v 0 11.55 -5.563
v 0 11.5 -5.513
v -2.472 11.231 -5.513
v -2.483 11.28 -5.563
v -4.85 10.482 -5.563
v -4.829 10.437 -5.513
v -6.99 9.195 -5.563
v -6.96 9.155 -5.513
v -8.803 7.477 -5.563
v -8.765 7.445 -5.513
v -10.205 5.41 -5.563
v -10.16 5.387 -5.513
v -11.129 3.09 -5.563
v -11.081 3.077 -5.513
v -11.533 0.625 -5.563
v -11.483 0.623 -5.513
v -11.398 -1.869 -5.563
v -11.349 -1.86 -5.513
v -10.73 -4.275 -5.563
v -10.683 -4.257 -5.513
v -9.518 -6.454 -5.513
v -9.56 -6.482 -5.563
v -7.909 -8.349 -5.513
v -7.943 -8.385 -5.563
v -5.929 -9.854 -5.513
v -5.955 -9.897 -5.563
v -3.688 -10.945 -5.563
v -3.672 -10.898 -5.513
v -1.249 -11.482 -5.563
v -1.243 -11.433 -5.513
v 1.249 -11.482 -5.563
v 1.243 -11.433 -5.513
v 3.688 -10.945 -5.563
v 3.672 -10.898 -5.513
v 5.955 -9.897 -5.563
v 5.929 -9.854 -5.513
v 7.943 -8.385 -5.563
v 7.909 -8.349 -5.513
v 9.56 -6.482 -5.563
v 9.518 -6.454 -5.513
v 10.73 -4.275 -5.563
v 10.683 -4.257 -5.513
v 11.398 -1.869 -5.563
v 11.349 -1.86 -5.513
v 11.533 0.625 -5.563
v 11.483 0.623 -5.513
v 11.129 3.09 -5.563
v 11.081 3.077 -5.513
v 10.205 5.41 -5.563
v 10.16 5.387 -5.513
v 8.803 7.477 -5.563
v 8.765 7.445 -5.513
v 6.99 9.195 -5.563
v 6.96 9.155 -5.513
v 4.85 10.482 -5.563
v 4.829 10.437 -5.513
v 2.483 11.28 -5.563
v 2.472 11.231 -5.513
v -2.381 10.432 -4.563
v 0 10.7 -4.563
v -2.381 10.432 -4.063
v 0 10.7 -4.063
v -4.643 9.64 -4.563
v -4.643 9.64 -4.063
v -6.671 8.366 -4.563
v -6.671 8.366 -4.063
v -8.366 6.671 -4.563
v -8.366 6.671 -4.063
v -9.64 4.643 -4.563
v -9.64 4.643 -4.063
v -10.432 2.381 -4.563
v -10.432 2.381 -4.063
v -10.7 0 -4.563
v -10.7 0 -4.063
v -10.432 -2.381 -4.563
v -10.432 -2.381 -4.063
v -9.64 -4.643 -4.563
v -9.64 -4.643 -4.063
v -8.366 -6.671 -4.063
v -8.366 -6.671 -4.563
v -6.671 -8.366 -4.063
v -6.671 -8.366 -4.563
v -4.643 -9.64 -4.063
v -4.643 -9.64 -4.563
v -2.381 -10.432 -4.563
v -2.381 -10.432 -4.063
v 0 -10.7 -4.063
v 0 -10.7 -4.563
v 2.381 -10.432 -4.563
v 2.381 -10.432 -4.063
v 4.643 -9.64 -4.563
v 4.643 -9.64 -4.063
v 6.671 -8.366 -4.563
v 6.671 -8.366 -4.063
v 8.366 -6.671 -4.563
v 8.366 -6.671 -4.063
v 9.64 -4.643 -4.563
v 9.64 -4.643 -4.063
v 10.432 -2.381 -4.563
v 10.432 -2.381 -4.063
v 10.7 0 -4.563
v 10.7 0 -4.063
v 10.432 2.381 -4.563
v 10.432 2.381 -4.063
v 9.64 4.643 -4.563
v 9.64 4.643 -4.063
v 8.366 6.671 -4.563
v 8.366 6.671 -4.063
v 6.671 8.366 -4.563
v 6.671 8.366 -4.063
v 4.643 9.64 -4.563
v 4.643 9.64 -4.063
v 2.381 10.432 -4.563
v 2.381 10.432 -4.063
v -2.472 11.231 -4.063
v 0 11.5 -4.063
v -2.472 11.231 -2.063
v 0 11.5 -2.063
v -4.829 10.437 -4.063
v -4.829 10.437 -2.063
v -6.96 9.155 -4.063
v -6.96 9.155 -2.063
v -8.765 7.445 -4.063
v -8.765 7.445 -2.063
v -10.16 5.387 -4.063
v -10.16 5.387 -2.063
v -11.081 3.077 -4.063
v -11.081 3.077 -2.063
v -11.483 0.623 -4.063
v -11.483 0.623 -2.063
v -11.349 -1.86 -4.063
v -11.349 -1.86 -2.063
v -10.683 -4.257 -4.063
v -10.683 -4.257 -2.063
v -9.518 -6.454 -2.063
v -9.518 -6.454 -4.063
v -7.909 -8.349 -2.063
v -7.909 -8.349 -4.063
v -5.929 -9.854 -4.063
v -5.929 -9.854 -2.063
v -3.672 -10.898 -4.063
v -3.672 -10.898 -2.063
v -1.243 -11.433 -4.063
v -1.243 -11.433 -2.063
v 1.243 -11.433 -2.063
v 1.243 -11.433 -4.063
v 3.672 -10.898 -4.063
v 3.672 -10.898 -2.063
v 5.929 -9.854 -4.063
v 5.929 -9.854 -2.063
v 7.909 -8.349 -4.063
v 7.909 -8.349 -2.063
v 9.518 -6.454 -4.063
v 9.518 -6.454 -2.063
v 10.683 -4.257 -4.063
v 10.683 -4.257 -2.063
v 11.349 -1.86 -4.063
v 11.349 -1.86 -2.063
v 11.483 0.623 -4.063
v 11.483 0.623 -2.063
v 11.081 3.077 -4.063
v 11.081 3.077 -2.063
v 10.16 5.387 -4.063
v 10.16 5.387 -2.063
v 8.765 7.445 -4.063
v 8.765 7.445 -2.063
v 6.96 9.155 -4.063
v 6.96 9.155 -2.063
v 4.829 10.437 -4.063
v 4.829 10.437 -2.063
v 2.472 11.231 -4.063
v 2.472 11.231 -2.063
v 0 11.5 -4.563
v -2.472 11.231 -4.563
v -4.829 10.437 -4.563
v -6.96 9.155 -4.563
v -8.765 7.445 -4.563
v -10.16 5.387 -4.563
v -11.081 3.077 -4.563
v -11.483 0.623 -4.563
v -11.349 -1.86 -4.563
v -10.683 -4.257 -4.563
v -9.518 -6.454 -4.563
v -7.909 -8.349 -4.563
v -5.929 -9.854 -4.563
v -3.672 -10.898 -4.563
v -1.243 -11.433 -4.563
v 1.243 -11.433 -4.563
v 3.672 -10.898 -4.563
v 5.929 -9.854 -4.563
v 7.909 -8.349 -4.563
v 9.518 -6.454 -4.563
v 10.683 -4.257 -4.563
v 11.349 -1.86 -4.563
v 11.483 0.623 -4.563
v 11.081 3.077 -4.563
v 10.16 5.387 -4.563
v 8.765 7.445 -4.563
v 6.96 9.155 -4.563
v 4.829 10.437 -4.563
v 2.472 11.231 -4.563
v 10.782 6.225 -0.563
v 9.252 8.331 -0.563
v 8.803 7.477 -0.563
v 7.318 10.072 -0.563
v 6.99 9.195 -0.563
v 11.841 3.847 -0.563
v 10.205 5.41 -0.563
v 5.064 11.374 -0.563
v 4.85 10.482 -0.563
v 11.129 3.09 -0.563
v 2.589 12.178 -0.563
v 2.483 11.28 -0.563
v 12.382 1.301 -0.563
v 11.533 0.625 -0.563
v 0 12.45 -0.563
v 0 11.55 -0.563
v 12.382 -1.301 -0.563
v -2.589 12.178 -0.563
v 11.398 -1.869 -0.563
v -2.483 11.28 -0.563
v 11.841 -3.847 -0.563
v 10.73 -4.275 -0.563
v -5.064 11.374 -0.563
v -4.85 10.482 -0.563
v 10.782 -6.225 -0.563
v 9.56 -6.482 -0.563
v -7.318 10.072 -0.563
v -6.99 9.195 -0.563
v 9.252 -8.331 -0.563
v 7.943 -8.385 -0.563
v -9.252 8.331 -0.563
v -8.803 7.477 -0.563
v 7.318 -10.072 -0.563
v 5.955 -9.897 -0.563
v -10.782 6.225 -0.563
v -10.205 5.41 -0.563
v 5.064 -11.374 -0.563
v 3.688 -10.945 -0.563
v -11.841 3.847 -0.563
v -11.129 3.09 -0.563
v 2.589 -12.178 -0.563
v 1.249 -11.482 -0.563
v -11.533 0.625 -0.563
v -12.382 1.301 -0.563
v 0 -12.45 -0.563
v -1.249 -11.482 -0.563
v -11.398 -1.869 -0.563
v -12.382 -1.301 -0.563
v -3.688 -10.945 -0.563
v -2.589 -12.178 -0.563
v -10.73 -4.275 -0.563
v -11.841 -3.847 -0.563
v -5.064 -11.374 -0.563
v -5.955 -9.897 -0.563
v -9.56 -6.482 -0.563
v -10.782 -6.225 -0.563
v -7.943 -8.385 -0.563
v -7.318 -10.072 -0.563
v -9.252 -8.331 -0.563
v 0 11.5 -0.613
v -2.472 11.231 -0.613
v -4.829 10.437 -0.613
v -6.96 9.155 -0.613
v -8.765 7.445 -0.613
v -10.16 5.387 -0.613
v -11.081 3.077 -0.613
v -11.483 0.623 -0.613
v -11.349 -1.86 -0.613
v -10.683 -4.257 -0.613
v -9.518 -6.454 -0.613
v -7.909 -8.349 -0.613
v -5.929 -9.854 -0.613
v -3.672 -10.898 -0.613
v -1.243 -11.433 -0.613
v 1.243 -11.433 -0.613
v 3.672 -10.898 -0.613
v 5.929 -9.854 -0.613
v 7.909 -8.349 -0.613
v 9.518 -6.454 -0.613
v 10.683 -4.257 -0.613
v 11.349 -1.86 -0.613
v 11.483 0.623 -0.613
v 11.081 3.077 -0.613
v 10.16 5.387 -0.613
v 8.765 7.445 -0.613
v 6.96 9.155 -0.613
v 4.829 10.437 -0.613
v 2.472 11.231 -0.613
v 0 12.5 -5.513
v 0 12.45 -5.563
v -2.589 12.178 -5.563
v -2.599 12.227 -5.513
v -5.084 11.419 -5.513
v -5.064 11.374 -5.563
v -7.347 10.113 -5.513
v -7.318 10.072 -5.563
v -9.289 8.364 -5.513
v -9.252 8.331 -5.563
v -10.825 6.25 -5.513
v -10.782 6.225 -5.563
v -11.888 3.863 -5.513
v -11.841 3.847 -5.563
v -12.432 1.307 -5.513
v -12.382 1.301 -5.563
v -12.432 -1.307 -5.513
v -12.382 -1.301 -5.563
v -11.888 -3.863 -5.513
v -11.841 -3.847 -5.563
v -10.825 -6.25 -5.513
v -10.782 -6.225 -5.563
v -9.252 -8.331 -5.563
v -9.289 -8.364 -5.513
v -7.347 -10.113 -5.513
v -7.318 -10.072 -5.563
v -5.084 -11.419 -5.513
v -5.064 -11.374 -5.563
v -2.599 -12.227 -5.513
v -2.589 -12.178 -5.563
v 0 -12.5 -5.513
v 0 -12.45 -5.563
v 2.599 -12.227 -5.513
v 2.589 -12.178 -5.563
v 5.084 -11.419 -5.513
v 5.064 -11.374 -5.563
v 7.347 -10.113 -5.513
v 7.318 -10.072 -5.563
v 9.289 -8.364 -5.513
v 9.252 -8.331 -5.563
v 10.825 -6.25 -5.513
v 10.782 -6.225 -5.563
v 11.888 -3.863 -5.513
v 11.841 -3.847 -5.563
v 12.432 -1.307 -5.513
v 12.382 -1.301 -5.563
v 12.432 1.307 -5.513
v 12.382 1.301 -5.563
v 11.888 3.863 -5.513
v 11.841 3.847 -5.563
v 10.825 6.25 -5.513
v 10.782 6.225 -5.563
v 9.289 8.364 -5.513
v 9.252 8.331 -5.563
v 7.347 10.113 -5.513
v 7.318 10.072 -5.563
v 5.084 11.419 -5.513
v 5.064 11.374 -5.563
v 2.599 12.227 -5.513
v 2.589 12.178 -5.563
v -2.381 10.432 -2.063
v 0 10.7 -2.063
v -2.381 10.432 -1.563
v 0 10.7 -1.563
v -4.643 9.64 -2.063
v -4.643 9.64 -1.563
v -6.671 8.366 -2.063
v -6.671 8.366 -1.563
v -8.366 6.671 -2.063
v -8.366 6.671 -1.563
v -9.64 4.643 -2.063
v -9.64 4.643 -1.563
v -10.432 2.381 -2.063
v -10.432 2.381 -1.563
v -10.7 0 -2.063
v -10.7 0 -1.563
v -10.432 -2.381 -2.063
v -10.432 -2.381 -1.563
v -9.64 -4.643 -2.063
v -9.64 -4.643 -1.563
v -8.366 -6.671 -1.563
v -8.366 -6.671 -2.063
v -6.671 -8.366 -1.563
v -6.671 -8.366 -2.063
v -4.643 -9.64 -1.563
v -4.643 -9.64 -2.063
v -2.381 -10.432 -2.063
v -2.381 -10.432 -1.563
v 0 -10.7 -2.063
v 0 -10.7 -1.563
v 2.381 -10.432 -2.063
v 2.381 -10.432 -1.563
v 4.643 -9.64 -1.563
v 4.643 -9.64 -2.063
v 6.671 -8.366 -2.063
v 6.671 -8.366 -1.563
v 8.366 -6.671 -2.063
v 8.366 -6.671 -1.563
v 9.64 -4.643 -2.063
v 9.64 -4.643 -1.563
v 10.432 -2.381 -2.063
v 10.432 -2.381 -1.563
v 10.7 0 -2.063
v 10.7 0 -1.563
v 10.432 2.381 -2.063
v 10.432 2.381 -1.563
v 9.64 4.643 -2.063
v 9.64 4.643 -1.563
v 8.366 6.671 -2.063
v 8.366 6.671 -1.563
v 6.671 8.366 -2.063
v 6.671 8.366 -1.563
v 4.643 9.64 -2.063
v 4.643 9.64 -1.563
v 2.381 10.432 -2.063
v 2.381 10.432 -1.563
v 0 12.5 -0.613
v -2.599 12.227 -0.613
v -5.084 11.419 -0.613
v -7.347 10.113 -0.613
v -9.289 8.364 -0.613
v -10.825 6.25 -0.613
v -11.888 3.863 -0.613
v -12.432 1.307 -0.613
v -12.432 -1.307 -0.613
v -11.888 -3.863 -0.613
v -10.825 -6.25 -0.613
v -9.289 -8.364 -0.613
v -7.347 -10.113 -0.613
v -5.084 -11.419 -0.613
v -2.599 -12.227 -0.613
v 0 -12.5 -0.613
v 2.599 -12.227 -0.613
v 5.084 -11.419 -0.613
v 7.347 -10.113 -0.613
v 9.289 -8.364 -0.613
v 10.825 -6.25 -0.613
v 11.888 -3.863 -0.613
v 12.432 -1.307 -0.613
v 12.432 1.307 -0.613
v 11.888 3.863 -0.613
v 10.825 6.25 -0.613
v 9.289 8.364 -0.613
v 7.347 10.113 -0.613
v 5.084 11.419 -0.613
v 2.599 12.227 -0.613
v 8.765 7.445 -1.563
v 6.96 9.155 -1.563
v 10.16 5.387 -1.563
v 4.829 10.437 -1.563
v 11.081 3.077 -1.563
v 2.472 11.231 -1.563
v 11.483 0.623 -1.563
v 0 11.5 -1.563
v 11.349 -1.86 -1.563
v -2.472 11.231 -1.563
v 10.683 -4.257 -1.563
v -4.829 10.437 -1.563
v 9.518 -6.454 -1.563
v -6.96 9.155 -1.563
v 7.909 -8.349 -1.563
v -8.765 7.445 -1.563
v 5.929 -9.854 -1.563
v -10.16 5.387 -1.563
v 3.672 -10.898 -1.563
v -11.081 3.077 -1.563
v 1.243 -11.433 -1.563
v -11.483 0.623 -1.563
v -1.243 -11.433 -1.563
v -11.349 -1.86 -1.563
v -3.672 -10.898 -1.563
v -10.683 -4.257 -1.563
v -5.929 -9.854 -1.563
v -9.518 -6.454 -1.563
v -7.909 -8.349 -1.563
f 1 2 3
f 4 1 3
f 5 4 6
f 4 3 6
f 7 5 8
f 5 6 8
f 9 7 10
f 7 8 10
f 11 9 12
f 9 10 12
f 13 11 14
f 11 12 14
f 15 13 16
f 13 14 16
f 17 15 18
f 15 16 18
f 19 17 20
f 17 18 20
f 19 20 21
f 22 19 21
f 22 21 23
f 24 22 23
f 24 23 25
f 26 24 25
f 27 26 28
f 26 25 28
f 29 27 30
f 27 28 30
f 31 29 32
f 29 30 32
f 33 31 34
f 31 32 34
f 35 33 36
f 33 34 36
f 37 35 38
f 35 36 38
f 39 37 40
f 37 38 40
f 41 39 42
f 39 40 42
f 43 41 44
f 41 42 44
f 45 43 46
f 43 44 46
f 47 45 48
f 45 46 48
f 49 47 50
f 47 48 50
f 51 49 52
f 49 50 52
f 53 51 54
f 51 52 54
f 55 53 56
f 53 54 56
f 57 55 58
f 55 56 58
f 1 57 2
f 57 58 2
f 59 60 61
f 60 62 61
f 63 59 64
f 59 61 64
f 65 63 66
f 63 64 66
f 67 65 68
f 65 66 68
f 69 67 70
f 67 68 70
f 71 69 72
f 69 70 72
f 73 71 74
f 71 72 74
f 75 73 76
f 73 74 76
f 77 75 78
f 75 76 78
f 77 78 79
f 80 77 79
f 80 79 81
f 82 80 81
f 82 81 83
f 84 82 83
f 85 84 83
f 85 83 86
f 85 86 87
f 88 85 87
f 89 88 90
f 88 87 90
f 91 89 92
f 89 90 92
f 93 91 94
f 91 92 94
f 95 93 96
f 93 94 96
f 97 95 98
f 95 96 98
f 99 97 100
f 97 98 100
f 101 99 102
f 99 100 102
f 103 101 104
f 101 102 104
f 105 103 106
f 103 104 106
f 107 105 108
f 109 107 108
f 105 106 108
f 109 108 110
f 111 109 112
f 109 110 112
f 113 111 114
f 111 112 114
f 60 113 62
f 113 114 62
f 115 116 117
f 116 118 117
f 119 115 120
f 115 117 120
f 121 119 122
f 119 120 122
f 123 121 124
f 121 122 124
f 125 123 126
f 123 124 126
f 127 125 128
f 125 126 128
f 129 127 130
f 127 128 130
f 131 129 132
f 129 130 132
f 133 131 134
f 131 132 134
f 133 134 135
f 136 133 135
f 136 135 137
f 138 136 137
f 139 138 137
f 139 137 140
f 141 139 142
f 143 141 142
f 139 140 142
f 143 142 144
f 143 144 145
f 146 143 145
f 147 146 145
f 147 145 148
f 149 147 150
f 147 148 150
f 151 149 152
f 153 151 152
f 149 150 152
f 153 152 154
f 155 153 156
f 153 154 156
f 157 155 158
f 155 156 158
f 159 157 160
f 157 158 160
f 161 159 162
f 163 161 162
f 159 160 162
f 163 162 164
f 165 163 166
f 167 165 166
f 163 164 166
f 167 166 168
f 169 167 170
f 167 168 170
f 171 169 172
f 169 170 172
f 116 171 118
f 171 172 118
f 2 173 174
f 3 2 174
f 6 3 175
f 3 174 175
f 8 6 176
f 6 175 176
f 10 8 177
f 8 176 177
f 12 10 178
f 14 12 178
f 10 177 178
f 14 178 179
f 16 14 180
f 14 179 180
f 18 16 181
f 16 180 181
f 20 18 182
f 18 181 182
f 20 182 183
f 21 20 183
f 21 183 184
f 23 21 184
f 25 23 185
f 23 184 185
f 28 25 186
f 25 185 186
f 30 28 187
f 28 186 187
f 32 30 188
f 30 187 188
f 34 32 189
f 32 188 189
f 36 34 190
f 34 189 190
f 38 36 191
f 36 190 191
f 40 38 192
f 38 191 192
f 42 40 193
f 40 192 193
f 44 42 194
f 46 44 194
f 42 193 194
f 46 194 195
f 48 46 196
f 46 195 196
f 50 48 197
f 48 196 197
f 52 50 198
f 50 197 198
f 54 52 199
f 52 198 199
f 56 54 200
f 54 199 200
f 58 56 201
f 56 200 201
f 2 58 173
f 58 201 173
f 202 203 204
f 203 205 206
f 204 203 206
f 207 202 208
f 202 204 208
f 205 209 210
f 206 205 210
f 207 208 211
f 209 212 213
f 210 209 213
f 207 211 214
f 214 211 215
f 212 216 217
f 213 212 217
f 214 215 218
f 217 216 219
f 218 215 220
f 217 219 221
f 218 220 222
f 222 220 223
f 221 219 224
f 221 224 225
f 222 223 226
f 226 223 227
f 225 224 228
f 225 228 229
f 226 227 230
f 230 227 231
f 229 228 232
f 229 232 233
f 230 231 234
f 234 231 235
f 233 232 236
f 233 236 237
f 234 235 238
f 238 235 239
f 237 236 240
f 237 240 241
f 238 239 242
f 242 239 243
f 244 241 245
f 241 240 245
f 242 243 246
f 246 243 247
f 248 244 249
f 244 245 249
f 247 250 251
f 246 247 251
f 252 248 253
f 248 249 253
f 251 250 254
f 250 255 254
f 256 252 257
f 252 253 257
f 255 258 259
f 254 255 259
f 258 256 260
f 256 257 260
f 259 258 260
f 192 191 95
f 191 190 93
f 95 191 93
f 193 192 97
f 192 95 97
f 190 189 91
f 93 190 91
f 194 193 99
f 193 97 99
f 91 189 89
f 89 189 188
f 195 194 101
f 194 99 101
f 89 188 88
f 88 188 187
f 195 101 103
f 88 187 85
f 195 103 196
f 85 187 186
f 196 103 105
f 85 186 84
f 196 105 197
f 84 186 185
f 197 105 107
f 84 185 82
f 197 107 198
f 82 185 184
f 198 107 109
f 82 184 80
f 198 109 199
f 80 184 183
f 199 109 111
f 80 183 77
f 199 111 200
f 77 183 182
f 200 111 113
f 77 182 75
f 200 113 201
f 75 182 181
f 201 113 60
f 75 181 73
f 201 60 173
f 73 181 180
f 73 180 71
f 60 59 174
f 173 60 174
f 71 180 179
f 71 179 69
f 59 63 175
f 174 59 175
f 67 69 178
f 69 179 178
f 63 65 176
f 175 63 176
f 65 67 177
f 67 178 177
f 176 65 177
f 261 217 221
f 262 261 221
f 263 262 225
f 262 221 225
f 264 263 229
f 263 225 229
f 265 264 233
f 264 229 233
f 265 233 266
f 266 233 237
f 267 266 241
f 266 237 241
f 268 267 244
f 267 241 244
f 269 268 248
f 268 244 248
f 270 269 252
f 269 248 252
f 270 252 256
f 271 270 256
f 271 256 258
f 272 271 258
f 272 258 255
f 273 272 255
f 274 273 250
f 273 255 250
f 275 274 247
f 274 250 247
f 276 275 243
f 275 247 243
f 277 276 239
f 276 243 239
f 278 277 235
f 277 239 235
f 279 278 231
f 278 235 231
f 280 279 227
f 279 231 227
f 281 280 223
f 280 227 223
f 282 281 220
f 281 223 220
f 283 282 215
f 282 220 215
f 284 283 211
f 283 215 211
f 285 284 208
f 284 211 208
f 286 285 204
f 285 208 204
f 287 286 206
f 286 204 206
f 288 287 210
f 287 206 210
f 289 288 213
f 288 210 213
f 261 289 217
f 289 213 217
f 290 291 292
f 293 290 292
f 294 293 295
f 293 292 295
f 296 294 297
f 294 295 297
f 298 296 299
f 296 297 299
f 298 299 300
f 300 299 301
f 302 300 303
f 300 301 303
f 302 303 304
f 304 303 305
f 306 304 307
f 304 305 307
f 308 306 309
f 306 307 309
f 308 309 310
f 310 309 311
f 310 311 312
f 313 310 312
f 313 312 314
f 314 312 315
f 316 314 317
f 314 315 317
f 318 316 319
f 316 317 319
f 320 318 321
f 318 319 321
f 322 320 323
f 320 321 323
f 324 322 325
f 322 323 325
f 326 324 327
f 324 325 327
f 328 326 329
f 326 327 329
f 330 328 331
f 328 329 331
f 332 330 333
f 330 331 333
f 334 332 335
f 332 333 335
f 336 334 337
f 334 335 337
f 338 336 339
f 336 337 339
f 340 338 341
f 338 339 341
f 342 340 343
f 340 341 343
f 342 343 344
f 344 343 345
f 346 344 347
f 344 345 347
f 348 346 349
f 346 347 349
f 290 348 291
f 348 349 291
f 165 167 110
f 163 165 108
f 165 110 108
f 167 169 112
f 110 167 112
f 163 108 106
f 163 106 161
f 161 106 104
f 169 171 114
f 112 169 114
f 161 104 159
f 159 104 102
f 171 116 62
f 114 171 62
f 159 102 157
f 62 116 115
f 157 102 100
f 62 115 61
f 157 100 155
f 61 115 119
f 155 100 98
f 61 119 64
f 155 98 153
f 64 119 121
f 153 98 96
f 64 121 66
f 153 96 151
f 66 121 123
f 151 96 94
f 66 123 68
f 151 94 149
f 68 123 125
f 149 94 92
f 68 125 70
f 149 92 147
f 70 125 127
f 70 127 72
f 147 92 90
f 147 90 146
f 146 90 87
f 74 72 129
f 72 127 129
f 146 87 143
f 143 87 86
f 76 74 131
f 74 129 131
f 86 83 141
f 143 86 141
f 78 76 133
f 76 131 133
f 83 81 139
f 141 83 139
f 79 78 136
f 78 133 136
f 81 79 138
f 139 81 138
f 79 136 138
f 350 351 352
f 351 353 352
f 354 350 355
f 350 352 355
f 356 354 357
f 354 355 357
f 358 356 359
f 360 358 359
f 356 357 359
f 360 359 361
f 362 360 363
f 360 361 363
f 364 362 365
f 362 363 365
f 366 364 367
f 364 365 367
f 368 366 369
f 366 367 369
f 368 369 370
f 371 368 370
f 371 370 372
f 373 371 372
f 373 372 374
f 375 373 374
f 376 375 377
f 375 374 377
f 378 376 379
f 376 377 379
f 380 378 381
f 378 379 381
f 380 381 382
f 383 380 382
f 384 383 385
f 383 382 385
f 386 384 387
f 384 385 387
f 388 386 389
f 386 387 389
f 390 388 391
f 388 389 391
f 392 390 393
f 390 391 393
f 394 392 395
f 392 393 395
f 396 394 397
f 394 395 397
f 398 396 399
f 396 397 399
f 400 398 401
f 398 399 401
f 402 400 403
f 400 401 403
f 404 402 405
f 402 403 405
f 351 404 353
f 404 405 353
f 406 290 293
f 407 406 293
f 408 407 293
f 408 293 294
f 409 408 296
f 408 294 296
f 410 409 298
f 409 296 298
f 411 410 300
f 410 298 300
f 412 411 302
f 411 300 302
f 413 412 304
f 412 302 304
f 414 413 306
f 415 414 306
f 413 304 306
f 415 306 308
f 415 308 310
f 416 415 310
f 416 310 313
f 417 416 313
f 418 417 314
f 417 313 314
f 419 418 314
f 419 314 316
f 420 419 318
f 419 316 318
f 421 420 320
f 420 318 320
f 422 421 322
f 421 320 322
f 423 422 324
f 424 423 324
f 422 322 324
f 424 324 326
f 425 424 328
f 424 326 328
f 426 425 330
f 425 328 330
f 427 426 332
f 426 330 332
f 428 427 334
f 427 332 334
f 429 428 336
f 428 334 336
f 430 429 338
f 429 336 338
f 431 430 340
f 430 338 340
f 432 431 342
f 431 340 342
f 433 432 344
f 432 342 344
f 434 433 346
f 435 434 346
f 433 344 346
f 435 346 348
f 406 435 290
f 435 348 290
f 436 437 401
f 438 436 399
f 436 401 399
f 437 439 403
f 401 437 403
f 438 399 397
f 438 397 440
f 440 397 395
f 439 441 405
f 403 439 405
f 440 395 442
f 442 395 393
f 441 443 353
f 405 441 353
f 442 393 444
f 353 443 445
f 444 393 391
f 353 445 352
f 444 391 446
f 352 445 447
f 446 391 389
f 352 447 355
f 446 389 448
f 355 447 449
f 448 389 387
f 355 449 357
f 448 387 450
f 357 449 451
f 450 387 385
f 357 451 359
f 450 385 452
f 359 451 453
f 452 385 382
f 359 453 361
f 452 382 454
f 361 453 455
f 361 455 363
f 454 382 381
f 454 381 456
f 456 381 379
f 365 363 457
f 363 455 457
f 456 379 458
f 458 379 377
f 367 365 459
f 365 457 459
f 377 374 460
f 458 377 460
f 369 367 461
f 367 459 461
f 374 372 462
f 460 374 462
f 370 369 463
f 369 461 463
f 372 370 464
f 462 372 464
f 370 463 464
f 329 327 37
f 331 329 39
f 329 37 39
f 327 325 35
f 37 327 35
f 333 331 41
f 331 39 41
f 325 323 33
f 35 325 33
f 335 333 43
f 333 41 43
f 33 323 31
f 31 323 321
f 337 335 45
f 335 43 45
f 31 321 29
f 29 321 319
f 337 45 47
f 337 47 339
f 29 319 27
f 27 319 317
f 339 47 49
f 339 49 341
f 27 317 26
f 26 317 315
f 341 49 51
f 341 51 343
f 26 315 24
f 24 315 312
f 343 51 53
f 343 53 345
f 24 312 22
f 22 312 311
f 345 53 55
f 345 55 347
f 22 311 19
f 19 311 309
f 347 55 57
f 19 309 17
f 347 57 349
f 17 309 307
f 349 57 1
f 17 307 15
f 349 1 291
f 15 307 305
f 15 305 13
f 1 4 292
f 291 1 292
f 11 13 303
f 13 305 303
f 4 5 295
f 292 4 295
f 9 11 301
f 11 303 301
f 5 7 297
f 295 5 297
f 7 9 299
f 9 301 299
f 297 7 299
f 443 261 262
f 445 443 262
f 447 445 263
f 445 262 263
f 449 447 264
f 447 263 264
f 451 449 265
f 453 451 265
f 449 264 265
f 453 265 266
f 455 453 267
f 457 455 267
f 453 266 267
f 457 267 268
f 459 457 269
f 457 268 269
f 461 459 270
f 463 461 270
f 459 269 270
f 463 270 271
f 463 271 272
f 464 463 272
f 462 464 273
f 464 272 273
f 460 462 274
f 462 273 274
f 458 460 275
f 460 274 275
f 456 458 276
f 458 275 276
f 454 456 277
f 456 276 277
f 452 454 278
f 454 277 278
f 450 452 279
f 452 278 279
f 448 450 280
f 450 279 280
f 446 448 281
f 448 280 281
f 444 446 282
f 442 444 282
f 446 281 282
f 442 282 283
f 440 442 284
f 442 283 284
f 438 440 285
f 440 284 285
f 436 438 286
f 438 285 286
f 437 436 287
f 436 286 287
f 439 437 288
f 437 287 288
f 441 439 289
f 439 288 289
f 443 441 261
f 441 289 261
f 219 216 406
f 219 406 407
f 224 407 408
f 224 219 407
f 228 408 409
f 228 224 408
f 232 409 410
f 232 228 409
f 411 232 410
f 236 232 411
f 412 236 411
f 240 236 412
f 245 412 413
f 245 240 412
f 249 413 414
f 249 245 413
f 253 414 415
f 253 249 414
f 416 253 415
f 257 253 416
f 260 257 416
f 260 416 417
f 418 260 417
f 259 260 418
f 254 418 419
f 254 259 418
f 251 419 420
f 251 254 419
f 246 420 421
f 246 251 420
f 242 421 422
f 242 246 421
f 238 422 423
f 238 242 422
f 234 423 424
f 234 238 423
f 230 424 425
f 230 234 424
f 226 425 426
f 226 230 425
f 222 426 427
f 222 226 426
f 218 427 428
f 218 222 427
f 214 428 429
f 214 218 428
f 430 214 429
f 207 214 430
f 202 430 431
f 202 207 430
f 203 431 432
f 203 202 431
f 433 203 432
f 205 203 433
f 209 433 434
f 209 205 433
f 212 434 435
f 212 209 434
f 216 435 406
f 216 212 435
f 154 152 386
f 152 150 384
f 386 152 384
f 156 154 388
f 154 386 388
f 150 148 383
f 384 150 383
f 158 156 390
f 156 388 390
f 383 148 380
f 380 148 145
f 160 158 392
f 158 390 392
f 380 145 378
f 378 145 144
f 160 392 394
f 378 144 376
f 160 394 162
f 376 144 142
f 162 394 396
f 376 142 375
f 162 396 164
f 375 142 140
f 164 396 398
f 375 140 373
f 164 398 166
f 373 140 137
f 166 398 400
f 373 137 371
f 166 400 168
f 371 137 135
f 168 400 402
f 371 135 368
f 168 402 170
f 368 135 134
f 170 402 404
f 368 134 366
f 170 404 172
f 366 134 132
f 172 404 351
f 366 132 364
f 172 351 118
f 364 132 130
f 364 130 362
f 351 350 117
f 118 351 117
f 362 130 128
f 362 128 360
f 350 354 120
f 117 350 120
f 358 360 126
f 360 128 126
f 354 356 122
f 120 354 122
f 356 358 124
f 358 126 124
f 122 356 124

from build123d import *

# Parameters (mm, degrees)
SMUSSO1_SIZE = 0.05


with BuildPart() as part:
    # Schizzo2 → Rivoluzione1 (revolve)
    with BuildSketch(Plane(origin=(0, 0, 0), x_dir=(0, 0, -1), z_dir=(1, 0, 0))):
        Polygon((0.563380282, 12.5), (5.563380282, 12.5), (5.563380282, 11.5), (4.563380282, 11.5), (4.563380282, 10.7), (4.063380282, 10.7), (4.063380282, 11.5), (2.063380282, 11.5), (2.063380282, 10.7), (1.563380282, 10.7), (1.563380282, 11.5), (0.563380282, 11.5), align=None)
    revolve(axis=Axis((0, 0, 0), (0, 0, 1)))

    # Smusso1
    smusso1_edges = [part.edges().sort_by_distance(p)[0] for p in [
        (0, -11.5, -5.563380282),
        (0, -12.5, -5.563380282),
        (0, -12.5, -0.563380282),
        (0, -11.5, -0.563380282),
    ]]
    chamfer(smusso1_edges, length=SMUSSO1_SIZE)


solid = part.part
